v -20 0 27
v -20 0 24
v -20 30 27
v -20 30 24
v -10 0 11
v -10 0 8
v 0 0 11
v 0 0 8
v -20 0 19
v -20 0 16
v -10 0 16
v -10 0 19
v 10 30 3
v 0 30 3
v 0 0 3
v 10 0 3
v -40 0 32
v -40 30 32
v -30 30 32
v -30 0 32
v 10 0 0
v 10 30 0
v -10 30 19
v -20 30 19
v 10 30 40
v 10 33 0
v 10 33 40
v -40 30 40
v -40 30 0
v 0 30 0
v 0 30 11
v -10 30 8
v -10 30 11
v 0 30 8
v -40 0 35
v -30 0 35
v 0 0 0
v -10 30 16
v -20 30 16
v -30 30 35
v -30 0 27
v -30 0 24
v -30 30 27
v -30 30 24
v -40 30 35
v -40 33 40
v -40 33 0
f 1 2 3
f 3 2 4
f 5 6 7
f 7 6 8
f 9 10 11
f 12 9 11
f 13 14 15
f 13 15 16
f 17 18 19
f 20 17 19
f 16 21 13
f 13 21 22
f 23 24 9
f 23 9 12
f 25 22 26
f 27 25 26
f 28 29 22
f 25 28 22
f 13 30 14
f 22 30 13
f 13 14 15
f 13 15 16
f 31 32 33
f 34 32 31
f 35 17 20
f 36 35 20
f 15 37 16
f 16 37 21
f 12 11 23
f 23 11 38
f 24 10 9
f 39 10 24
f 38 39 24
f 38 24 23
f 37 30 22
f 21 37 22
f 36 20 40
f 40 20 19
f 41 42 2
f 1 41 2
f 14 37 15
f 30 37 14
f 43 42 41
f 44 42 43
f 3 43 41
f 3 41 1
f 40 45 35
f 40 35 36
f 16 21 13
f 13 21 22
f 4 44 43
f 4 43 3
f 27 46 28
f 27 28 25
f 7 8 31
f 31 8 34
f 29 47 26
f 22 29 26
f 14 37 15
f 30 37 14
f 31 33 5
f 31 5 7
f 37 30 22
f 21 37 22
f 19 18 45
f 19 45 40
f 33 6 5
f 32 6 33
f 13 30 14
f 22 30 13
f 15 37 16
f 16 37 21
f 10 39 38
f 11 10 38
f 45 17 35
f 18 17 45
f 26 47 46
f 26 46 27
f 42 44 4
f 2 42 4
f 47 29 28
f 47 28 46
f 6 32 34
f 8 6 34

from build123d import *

# Parameters (mm, degrees)
BOX_W        = 10
BOX_H        = 30
BOX_DEPTH    = 3
BOX001_W     = 10
BOX001_H     = 30
BOX001_DEPTH = 3
BOX002_W     = 10
BOX002_H     = 30
BOX002_DEPTH = 3
BOX003_W     = 10
BOX003_H     = 30
BOX003_DEPTH = 3
BOX004_W     = 10
BOX004_H     = 30
BOX004_DEPTH = 3
BOX005_W     = 50
BOX005_H     = 3
BOX005_DEPTH = 40
BOX006_W     = 10
BOX006_H     = 30
BOX006_DEPTH = 3


with BuildPart() as cubo:
    # Box → Box (new body)
    with BuildSketch(Plane(origin=(-30, 0, 24), x_dir=(1, 0, 0), z_dir=(0, 0, 1))):
        with Locations((5, 15)):
            Rectangle(BOX_W, BOX_H)
    extrude(amount=BOX_DEPTH)


with BuildPart() as cubo001:
    # Box001 → Box001 (new body)
    with BuildSketch(Plane(origin=(-20, 0, 16), x_dir=(1, 0, 0), z_dir=(0, 0, 1))):
        with Locations((5, 15)):
            Rectangle(BOX001_W, BOX001_H)
    extrude(amount=BOX001_DEPTH)


with BuildPart() as cubo002:
    # Box002 → Box002 (new body)
    with BuildSketch(Plane(origin=(-10, 0, 8), x_dir=(1, 0, 0), z_dir=(0, 0, 1))):
        with Locations((5, 15)):
            Rectangle(BOX002_W, BOX002_H)
    extrude(amount=BOX002_DEPTH)


with BuildPart() as cubo003:
    # Box003 → Box003 (new body)
    with BuildSketch(Plane.XY):
        with Locations((5, 15)):
            Rectangle(BOX003_W, BOX003_H)
    extrude(amount=BOX003_DEPTH)


with BuildPart() as cubo004:
    # Box004 → Box004 (new body)
    with BuildSketch(Plane.XY):
        with Locations((5, 15)):
            Rectangle(BOX004_W, BOX004_H)
    extrude(amount=BOX004_DEPTH)


with BuildPart() as cubo005:
    # Box005 → Box005 (new body)
    with BuildSketch(Plane(origin=(-40, 30, 0), x_dir=(1, 0, 0), z_dir=(0, 0, 1))):
        with Locations((25, 1.5)):
            Rectangle(BOX005_W, BOX005_H)
    extrude(amount=BOX005_DEPTH)


with BuildPart() as cubo006:
    # Box006 → Box006 (new body)
    with BuildSketch(Plane(origin=(-40, 0, 32), x_dir=(1, 0, 0), z_dir=(0, 0, 1))):
        with Locations((5, 15)):
            Rectangle(BOX006_W, BOX006_H)
    extrude(amount=BOX006_DEPTH)


solid = Compound([cubo.part, cubo001.part, cubo002.part, cubo003.part, cubo004.part, cubo005.part, cubo006.part])
